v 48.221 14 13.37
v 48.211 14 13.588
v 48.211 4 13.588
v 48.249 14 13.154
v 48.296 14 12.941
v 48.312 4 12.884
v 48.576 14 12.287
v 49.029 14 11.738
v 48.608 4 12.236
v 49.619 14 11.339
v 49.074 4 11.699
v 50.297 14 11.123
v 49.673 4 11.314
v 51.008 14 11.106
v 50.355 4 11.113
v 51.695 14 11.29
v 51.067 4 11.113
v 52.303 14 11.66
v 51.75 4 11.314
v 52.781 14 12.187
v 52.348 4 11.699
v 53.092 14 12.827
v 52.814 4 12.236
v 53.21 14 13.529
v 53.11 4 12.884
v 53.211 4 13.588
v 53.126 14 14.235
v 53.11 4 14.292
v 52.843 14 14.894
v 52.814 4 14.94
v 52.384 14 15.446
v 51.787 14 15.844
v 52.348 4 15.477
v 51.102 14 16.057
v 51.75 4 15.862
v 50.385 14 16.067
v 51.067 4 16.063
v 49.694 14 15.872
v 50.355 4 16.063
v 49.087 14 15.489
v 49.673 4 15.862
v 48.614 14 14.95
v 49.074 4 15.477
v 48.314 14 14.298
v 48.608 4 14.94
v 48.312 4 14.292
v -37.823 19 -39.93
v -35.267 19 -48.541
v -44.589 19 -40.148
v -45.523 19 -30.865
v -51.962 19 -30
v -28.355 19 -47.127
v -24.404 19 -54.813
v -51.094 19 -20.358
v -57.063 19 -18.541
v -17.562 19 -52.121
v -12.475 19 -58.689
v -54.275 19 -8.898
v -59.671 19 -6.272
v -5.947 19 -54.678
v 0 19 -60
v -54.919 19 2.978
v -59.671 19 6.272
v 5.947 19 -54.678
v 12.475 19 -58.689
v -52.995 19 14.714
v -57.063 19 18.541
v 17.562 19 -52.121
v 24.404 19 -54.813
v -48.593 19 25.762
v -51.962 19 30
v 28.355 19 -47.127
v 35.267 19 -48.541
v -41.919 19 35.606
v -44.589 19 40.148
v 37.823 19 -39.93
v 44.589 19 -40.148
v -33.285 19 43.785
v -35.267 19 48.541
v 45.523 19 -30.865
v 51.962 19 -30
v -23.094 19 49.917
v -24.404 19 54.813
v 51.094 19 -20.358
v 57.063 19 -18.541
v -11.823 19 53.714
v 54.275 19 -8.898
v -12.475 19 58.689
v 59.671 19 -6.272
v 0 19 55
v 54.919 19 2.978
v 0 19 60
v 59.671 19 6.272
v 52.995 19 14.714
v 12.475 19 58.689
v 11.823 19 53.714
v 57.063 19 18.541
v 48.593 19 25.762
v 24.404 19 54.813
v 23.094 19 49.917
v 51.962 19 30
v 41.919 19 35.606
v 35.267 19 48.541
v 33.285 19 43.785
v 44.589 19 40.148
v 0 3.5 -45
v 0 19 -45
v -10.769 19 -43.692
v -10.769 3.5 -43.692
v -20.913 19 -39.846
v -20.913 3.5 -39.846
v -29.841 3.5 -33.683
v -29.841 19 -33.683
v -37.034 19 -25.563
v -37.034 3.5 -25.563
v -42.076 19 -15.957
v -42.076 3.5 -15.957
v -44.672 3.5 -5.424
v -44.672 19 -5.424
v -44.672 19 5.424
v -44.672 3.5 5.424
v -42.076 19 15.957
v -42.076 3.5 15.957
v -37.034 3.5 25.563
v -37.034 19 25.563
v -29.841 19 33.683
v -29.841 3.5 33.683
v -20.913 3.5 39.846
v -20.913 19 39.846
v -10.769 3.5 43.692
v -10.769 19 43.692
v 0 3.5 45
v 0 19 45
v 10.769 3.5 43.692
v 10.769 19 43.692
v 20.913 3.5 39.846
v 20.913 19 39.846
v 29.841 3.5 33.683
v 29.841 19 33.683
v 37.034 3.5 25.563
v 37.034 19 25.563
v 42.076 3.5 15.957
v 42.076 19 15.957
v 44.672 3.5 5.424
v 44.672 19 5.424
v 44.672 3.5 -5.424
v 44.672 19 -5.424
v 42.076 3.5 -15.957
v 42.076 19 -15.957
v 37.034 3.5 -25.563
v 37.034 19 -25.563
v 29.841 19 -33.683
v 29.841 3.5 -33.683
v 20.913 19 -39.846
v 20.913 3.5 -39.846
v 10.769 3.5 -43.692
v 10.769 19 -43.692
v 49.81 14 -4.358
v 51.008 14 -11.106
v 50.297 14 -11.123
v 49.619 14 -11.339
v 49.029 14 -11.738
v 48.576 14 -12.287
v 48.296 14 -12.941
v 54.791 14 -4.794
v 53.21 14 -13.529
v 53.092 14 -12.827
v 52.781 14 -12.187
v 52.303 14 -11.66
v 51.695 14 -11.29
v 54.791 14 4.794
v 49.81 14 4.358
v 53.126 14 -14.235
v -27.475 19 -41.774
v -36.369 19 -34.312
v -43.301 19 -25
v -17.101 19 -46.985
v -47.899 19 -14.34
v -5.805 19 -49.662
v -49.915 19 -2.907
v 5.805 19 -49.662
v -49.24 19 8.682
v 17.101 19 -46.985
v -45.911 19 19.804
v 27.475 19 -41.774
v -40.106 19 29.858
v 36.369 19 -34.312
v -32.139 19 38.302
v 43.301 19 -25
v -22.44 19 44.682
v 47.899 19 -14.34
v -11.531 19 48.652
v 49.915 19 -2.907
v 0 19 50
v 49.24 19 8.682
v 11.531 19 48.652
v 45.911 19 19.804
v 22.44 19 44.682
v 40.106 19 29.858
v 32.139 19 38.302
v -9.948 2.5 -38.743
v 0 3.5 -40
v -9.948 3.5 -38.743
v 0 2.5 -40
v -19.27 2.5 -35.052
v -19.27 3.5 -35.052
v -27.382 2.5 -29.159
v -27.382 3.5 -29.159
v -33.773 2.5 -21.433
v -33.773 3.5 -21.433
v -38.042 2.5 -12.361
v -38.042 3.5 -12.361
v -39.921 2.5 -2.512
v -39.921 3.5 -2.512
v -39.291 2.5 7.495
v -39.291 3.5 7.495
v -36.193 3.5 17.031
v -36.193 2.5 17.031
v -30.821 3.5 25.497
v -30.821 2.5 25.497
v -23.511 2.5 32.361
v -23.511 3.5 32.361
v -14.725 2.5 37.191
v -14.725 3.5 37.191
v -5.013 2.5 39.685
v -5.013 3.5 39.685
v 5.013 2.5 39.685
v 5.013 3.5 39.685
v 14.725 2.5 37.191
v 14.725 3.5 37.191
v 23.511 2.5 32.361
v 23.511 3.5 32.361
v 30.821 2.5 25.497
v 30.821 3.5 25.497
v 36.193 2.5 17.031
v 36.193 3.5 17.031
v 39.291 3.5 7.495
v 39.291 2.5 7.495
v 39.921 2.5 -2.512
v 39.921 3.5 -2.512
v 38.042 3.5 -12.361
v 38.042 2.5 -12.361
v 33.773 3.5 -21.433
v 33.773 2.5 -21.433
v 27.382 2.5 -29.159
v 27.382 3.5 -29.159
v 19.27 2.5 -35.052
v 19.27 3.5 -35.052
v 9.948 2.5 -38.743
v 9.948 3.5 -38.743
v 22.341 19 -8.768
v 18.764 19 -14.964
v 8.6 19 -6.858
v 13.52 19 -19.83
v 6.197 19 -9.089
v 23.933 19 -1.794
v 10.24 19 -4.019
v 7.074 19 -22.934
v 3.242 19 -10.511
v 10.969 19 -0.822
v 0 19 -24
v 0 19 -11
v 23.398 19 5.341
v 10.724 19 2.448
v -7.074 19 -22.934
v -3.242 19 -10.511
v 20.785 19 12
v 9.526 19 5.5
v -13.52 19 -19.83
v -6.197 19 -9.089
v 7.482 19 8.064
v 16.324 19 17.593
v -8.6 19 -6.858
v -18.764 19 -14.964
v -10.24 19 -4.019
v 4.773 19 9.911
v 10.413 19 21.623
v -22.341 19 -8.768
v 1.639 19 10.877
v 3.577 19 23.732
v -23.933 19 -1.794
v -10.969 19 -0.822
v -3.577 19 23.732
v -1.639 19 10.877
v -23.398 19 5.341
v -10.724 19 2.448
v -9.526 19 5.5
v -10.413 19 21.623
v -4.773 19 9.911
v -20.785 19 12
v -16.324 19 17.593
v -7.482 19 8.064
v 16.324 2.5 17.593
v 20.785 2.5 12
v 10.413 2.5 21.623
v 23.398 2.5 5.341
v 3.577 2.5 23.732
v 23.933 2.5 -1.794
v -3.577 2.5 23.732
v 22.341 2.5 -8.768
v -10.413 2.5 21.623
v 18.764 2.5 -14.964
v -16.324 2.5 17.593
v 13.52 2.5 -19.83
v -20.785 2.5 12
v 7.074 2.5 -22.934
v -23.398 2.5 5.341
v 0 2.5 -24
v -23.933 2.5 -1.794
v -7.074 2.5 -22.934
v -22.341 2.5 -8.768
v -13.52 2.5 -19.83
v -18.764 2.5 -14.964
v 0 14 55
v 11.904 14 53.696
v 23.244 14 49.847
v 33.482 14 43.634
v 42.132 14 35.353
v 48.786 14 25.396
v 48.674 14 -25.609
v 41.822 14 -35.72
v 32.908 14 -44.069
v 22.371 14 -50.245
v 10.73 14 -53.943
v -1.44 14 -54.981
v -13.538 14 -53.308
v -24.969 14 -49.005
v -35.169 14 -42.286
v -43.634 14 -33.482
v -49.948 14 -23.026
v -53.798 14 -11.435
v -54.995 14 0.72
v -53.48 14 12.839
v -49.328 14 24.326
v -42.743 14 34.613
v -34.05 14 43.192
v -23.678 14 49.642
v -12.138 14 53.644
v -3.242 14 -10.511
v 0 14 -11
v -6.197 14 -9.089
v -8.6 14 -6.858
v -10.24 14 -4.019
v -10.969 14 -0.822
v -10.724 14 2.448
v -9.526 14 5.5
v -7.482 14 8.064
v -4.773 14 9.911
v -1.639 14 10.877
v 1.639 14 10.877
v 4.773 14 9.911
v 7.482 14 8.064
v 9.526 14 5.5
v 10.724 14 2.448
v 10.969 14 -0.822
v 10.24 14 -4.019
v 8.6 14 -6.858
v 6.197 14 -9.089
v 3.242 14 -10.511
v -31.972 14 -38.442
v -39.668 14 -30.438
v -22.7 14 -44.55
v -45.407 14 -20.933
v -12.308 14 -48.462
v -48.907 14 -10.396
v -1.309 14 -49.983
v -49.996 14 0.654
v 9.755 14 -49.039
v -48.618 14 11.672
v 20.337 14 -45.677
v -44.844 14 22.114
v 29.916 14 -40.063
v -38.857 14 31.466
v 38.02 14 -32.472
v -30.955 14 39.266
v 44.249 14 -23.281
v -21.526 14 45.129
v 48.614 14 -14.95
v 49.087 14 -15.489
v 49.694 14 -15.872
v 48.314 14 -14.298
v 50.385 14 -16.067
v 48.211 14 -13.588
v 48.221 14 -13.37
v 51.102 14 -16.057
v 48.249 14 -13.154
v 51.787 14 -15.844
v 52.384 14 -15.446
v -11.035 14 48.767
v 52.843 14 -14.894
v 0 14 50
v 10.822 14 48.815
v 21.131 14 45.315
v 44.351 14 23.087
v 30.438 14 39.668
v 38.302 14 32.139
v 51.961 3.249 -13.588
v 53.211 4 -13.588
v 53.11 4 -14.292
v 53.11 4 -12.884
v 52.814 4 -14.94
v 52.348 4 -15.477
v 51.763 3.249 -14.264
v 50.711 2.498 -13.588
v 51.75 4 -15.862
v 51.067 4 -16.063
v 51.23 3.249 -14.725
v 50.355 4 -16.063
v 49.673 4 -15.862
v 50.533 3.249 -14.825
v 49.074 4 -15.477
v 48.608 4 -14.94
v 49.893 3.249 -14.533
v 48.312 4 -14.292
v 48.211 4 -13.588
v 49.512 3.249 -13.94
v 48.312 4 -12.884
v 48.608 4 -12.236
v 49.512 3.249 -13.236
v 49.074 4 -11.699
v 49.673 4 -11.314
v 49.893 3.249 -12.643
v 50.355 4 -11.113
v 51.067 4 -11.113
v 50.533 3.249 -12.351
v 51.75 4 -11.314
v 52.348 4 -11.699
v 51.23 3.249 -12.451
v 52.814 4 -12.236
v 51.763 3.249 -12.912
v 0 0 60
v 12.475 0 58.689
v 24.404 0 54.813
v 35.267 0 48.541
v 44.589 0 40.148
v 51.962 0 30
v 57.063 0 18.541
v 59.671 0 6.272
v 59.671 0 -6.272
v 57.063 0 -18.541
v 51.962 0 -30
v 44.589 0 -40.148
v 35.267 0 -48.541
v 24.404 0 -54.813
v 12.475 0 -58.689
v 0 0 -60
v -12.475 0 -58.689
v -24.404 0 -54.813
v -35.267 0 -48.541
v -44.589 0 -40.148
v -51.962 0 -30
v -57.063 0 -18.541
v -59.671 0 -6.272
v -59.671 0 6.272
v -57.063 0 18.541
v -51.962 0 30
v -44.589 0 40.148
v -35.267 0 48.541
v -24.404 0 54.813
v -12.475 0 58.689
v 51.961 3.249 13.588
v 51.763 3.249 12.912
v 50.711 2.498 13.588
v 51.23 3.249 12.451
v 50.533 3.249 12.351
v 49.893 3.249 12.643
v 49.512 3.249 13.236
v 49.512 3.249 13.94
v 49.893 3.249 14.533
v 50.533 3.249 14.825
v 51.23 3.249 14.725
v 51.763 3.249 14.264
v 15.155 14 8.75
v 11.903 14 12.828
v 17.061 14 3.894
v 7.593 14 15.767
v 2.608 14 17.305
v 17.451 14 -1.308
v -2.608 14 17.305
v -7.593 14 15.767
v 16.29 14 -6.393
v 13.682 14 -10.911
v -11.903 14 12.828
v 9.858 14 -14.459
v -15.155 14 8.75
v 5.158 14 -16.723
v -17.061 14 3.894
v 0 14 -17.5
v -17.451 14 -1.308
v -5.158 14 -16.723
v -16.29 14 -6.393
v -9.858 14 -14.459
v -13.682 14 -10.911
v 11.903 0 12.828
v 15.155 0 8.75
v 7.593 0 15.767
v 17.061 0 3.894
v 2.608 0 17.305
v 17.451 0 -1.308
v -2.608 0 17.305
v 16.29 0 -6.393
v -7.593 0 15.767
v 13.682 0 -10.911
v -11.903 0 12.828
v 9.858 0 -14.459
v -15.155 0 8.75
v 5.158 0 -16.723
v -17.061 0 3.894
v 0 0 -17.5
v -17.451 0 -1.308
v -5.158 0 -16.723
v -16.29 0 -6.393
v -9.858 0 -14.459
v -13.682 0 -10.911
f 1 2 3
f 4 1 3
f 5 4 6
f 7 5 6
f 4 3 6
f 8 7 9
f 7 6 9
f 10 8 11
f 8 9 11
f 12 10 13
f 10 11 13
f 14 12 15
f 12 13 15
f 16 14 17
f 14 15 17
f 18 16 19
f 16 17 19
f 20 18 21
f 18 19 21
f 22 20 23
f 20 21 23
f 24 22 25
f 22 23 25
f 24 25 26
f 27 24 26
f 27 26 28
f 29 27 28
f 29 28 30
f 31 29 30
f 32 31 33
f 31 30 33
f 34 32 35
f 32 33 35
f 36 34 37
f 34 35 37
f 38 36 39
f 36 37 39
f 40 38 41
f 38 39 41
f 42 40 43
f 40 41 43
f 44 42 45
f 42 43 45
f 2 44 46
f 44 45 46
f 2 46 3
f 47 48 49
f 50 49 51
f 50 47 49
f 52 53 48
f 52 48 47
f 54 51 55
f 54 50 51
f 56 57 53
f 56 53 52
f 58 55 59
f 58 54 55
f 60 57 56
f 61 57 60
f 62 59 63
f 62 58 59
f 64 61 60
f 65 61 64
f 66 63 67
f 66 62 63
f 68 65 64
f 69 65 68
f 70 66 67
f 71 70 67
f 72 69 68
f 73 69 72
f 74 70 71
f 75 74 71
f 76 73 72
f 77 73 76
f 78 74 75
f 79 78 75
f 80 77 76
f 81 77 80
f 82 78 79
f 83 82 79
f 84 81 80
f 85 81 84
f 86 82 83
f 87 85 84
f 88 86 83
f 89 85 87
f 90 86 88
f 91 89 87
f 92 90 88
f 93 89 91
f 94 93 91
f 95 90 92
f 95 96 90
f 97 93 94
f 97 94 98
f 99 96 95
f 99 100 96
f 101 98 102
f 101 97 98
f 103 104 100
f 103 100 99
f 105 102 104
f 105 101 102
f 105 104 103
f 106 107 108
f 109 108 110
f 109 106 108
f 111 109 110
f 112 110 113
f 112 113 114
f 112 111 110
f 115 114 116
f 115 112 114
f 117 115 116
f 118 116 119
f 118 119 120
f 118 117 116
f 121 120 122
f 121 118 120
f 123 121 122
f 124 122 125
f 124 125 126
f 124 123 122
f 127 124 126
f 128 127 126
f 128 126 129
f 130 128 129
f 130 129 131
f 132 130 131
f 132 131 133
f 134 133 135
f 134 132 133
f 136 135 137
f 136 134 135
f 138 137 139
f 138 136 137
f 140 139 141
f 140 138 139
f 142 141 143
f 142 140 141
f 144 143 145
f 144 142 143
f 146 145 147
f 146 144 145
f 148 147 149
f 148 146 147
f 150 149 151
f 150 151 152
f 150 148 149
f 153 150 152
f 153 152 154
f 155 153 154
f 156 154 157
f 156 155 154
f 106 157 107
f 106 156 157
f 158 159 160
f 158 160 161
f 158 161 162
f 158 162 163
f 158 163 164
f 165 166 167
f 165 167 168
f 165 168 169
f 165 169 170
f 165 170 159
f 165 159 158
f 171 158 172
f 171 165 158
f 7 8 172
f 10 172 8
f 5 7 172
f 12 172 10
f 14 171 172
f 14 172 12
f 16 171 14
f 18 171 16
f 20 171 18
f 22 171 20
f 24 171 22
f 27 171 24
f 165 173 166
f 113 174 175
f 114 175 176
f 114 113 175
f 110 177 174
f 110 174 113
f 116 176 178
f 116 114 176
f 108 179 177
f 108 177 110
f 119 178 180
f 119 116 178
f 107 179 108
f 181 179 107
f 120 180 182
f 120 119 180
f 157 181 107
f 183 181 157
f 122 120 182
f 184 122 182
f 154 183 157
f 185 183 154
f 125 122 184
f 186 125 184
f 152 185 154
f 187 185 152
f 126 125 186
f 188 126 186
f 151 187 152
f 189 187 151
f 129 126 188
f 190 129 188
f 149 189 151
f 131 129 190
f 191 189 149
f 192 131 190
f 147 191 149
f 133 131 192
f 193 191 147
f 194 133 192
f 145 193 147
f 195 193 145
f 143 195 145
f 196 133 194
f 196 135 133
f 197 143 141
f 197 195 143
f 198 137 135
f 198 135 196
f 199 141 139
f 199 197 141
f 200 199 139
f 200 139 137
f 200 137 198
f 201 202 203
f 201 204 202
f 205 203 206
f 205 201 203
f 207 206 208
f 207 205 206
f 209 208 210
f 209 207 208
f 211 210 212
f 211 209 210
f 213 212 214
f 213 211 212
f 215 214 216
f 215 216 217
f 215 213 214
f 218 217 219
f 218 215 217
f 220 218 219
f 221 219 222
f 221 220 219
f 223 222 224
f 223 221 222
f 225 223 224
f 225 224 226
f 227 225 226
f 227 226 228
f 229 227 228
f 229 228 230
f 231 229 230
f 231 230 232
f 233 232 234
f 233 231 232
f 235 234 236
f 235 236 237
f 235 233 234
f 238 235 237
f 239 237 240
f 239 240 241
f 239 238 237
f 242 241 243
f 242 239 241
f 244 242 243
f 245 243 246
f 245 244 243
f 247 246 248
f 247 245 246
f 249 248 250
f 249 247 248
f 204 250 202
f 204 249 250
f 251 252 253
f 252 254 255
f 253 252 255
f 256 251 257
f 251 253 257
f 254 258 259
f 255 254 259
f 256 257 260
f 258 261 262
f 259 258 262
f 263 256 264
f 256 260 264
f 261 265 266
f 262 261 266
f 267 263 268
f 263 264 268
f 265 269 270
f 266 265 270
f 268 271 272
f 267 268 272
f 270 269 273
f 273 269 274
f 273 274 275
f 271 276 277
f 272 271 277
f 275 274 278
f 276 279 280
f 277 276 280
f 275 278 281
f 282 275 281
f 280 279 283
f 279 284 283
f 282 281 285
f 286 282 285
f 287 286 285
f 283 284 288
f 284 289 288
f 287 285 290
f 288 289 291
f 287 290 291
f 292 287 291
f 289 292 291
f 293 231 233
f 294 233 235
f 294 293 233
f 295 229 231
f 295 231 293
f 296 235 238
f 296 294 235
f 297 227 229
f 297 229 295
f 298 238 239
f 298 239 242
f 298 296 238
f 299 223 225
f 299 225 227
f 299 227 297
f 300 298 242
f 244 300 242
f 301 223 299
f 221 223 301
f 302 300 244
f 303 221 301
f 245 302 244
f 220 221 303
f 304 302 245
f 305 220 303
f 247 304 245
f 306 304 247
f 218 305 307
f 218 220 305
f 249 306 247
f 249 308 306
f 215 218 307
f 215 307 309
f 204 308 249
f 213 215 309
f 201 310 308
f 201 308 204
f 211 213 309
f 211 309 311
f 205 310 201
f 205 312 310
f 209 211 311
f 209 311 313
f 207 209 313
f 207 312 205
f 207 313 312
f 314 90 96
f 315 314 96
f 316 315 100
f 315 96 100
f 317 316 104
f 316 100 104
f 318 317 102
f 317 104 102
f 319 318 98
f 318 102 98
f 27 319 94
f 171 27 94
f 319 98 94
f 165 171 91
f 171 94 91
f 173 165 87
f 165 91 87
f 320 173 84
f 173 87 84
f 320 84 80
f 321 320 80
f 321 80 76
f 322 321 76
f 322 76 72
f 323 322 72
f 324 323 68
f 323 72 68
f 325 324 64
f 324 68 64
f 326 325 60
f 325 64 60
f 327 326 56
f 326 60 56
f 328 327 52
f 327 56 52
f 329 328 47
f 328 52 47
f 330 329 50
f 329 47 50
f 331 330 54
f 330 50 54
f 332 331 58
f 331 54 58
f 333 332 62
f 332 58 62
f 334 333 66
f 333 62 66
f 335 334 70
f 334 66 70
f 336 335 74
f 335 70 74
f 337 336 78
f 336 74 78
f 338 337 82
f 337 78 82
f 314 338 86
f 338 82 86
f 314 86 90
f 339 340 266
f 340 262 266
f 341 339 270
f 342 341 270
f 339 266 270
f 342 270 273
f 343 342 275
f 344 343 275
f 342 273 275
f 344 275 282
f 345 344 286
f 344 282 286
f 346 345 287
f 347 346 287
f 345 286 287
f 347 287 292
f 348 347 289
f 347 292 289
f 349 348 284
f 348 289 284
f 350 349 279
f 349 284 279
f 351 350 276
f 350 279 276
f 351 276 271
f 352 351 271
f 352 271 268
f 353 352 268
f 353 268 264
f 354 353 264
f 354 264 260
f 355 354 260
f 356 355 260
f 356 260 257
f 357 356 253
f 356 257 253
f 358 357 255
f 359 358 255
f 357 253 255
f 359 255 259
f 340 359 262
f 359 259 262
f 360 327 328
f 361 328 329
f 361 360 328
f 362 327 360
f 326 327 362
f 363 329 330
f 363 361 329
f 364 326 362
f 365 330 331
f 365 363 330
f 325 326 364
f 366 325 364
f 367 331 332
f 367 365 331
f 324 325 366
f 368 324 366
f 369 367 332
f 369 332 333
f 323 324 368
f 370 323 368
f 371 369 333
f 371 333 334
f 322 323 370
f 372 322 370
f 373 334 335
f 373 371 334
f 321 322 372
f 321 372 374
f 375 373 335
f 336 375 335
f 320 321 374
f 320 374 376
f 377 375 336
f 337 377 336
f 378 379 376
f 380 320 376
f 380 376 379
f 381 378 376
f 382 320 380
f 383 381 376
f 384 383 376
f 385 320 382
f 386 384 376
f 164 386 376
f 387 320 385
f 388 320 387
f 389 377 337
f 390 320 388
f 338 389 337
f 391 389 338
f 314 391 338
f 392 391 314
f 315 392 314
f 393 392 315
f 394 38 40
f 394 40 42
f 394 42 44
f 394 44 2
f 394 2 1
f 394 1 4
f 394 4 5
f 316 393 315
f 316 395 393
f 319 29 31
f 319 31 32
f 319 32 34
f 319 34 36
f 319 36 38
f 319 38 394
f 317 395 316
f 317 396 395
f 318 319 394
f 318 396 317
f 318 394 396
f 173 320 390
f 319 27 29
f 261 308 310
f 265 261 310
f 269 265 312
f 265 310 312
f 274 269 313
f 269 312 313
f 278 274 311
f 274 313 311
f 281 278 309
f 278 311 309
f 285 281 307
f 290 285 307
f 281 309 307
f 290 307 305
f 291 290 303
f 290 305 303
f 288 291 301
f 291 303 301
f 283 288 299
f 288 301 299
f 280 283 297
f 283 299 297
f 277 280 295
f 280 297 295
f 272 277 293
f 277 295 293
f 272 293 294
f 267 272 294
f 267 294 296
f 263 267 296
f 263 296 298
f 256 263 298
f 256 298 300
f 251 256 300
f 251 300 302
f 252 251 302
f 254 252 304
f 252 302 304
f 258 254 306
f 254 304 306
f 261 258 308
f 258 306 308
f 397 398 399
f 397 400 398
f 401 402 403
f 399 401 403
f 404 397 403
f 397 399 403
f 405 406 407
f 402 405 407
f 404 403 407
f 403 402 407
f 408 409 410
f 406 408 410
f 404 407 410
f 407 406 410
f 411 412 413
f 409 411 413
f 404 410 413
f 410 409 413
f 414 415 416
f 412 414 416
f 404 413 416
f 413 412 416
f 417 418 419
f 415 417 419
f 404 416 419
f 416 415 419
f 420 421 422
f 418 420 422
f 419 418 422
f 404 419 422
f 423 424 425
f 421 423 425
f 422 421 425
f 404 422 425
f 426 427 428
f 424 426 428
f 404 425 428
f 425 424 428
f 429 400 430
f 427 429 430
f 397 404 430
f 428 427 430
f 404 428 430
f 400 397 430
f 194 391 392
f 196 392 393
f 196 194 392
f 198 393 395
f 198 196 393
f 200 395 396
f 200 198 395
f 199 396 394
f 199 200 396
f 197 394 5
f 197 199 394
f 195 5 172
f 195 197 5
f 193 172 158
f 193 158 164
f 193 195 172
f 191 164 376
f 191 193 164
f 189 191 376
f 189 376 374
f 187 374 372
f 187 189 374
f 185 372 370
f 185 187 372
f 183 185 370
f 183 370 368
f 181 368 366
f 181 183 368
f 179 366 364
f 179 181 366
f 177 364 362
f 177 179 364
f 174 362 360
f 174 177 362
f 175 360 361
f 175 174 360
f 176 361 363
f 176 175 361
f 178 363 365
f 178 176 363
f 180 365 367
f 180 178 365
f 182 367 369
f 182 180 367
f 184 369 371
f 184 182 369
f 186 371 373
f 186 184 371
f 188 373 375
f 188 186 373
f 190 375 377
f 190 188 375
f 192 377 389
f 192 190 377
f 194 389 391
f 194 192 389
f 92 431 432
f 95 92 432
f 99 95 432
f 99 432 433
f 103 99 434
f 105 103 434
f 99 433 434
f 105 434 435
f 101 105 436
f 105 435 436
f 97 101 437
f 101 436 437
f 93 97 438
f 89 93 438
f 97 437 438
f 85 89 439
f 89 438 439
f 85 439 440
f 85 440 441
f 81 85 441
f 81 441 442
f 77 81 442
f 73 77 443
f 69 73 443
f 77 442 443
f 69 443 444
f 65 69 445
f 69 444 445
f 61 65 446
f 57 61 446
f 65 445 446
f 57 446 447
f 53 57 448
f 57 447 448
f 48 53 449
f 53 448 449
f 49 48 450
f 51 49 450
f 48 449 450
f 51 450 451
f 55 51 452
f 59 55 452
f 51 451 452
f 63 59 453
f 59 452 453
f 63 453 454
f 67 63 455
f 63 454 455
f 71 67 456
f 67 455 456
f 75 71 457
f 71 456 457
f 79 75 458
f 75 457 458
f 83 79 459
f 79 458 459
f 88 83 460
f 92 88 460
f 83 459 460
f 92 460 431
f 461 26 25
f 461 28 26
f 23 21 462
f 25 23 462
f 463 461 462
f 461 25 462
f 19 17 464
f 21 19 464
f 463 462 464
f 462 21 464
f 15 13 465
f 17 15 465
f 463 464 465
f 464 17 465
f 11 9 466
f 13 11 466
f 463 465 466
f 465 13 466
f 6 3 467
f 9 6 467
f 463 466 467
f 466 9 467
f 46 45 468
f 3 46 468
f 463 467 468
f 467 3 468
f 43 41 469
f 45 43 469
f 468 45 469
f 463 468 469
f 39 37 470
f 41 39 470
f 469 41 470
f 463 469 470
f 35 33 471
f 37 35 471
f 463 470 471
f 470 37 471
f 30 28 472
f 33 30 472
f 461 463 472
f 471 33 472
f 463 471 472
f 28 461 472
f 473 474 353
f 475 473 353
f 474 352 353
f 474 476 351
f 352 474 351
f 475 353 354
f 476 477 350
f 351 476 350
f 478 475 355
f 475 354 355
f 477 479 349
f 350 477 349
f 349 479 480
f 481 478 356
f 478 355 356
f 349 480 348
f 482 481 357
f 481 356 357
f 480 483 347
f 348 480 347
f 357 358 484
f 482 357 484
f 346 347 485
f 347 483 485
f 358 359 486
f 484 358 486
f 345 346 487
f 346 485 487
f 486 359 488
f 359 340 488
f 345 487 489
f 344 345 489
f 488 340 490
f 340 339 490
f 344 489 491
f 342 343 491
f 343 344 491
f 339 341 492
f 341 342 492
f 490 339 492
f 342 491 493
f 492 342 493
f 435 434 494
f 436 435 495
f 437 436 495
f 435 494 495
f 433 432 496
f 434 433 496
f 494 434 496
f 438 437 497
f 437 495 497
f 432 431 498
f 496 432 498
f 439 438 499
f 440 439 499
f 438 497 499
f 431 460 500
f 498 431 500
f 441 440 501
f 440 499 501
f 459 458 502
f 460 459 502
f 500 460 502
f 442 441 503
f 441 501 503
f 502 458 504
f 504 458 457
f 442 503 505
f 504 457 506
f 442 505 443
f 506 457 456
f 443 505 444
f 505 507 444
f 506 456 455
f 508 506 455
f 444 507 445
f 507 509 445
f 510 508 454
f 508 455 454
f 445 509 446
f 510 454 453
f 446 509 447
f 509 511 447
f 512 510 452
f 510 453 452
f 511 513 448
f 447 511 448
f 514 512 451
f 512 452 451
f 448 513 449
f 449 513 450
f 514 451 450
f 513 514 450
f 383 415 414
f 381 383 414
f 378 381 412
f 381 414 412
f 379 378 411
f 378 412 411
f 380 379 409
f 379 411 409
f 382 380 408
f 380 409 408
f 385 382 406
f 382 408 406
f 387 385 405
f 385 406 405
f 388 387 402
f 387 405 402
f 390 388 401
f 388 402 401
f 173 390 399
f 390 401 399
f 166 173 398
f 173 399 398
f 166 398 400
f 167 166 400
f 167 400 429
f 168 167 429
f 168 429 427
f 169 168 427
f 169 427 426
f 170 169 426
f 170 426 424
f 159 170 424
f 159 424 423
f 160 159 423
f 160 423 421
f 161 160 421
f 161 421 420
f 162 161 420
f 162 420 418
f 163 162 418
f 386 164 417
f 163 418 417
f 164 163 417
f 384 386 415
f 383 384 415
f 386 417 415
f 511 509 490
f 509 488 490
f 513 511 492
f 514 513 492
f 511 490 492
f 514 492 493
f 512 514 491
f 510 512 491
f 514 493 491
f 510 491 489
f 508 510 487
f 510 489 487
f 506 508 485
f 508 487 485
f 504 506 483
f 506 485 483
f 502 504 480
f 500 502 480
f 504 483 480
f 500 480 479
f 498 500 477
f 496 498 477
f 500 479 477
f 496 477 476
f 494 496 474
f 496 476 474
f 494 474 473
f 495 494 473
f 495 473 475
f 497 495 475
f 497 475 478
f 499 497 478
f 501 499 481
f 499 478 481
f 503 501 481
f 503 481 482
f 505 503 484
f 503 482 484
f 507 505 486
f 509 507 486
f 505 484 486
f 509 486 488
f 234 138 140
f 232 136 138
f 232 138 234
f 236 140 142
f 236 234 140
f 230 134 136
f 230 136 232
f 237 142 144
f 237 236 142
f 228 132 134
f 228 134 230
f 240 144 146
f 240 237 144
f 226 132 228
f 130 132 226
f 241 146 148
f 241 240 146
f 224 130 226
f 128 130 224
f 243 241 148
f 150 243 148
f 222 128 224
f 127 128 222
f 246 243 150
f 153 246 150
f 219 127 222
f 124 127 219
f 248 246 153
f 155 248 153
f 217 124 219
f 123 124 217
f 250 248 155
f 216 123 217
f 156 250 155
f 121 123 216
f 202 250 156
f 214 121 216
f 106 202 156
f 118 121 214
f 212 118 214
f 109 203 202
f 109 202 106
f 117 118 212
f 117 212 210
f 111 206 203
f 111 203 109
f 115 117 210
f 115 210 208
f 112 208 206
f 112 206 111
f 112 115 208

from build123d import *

# Parameters (mm, degrees)
SKETCH1_R             = 60
BOSS_EXTRUDE1_DEPTH   = 19
SKETCH2_R             = 55
SKETCH2_R_2           = 50
CUT_EXTRUDE1_DEPTH    = 5
SKETCH6_W             = 17.5
SKETCH6_H             = 14
M6_TAPPED_HOLE1_D     = 5
M6_TAPPED_HOLE1_DEPTH = 15
M6_TAPPED_HOLE1_TIP   = 1.502151548


with BuildPart() as part:
    # Sketch1 → Boss-Extrude1 (new body)
    with BuildSketch(Plane(origin=(0, 0, 0), x_dir=(1, 0, 0), z_dir=(0, 1, 0))):
        with Locations(Location((0, 0, 0), (0, 0, 270))):
            Circle(SKETCH1_R)
    extrude(amount=BOSS_EXTRUDE1_DEPTH)

    # Sketch2 → Cut-Extrude1 (cut)
    with BuildSketch(Plane(origin=(0, 19, 0), x_dir=(1, 0, 0), z_dir=(0, 1, 0))):
        with Locations(Location((0, 0, 0), (0, 0, 270))):
            Circle(SKETCH2_R)
        with Locations(Location((0, 0, 0), (0, 0, 270))):
            Circle(SKETCH2_R_2, mode=Mode.SUBTRACT)
    extrude(amount=-CUT_EXTRUDE1_DEPTH, mode=Mode.SUBTRACT)

    # Sketch4 → Cut-Revolve1 (revolve, cut)
    with BuildSketch(Plane.XY, mode=Mode.PRIVATE) as cut_revolve1_sk:
        Polygon((45, 19), (45, 3.5), (40, 3.5), (40, 2.5), (0, 2.5), (0, 19), align=None)
    revolve(cut_revolve1_sk.sketch.rotate(Axis((0, 0, 0), (0, 1, 0)), 90), axis=Axis((0, 0, 0), (0, 1, 0)), mode=Mode.SUBTRACT)

    # Sketch5 → Revolve1 (revolve)
    with BuildSketch(Plane.XY, mode=Mode.PRIVATE) as revolve1_sk:
        Polygon((17.5, 0), (17.5, 14), (11, 14), (11, 19), (24, 19), (24, 0), align=None)
    revolve(revolve1_sk.sketch.rotate(Axis((0, 0, 0), (0, 1, 0)), 90), axis=Axis((0, 0, 0), (0, 1, 0)))

    # Sketch6 → Cut-Revolve2 (revolve, cut)
    with BuildSketch(Plane.XY, mode=Mode.PRIVATE) as cut_revolve2_sk:
        with Locations((8.75, 7)):
            Rectangle(SKETCH6_W, SKETCH6_H)
    revolve(cut_revolve2_sk.sketch.rotate(Axis((0, 0, 0), (0, 1, 0)), 90), axis=Axis((0, 0, 0), (0, 1, 0)), mode=Mode.SUBTRACT)

    # M6 Tapped Hole1
    with Locations(Plane(origin=(0, 19, 0), x_dir=(1, 0, 0), z_dir=(0, 1, 0))):
        with Locations((50.71110588, 13.587999868), (50.71110588, -13.587999868)):
            Hole(M6_TAPPED_HOLE1_D / 2, depth=M6_TAPPED_HOLE1_DEPTH)
            with Locations((0, 0, -(M6_TAPPED_HOLE1_DEPTH + M6_TAPPED_HOLE1_TIP / 2))):  # 118° drill point
                Cone(0, M6_TAPPED_HOLE1_D / 2, M6_TAPPED_HOLE1_TIP, mode=Mode.SUBTRACT)


solid = part.part
